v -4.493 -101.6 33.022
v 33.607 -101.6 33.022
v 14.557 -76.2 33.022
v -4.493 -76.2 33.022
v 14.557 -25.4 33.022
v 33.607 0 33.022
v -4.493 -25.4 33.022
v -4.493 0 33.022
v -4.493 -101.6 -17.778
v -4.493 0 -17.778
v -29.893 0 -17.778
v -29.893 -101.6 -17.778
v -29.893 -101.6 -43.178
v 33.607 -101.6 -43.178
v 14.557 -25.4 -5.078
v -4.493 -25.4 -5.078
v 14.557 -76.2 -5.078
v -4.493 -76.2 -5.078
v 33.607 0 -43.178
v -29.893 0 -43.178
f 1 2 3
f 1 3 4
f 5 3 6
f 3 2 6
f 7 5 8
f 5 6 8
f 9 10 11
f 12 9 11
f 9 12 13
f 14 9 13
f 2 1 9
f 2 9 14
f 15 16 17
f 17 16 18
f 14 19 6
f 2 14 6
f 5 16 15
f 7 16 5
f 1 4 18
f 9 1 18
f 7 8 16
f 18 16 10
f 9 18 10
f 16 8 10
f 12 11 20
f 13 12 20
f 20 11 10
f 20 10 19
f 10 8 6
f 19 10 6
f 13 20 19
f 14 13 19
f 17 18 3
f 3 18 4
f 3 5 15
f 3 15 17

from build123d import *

# Parameters (mm, degrees)
F1_DEPTH = 101.6
F2_W     = 50.8
F2_H     = 38.1
F3_DEPTH = 19.05


with BuildPart() as f1:
    # F0 (on Front) → F1 (new body)
    with BuildSketch(Plane.XZ):
        Polygon((-29.8929, -17.777541), (-29.8929, -43.177541), (33.6071, -43.177541), (33.6071, 33.022459), (-4.4929, 33.022459), (-4.4929, -17.777541), align=None)
    extrude(amount=F1_DEPTH)

    # F2 (on face) → F3 (cut)
    with BuildSketch(Plane(origin=(-4.4929, 0, 0), x_dir=(0, -1, 0), z_dir=(-1, 0, 0))):
        with Locations((50.8, 13.972459)):
            Rectangle(F2_W, F2_H)
    extrude(amount=-F3_DEPTH, mode=Mode.SUBTRACT)


solid = f1.part
